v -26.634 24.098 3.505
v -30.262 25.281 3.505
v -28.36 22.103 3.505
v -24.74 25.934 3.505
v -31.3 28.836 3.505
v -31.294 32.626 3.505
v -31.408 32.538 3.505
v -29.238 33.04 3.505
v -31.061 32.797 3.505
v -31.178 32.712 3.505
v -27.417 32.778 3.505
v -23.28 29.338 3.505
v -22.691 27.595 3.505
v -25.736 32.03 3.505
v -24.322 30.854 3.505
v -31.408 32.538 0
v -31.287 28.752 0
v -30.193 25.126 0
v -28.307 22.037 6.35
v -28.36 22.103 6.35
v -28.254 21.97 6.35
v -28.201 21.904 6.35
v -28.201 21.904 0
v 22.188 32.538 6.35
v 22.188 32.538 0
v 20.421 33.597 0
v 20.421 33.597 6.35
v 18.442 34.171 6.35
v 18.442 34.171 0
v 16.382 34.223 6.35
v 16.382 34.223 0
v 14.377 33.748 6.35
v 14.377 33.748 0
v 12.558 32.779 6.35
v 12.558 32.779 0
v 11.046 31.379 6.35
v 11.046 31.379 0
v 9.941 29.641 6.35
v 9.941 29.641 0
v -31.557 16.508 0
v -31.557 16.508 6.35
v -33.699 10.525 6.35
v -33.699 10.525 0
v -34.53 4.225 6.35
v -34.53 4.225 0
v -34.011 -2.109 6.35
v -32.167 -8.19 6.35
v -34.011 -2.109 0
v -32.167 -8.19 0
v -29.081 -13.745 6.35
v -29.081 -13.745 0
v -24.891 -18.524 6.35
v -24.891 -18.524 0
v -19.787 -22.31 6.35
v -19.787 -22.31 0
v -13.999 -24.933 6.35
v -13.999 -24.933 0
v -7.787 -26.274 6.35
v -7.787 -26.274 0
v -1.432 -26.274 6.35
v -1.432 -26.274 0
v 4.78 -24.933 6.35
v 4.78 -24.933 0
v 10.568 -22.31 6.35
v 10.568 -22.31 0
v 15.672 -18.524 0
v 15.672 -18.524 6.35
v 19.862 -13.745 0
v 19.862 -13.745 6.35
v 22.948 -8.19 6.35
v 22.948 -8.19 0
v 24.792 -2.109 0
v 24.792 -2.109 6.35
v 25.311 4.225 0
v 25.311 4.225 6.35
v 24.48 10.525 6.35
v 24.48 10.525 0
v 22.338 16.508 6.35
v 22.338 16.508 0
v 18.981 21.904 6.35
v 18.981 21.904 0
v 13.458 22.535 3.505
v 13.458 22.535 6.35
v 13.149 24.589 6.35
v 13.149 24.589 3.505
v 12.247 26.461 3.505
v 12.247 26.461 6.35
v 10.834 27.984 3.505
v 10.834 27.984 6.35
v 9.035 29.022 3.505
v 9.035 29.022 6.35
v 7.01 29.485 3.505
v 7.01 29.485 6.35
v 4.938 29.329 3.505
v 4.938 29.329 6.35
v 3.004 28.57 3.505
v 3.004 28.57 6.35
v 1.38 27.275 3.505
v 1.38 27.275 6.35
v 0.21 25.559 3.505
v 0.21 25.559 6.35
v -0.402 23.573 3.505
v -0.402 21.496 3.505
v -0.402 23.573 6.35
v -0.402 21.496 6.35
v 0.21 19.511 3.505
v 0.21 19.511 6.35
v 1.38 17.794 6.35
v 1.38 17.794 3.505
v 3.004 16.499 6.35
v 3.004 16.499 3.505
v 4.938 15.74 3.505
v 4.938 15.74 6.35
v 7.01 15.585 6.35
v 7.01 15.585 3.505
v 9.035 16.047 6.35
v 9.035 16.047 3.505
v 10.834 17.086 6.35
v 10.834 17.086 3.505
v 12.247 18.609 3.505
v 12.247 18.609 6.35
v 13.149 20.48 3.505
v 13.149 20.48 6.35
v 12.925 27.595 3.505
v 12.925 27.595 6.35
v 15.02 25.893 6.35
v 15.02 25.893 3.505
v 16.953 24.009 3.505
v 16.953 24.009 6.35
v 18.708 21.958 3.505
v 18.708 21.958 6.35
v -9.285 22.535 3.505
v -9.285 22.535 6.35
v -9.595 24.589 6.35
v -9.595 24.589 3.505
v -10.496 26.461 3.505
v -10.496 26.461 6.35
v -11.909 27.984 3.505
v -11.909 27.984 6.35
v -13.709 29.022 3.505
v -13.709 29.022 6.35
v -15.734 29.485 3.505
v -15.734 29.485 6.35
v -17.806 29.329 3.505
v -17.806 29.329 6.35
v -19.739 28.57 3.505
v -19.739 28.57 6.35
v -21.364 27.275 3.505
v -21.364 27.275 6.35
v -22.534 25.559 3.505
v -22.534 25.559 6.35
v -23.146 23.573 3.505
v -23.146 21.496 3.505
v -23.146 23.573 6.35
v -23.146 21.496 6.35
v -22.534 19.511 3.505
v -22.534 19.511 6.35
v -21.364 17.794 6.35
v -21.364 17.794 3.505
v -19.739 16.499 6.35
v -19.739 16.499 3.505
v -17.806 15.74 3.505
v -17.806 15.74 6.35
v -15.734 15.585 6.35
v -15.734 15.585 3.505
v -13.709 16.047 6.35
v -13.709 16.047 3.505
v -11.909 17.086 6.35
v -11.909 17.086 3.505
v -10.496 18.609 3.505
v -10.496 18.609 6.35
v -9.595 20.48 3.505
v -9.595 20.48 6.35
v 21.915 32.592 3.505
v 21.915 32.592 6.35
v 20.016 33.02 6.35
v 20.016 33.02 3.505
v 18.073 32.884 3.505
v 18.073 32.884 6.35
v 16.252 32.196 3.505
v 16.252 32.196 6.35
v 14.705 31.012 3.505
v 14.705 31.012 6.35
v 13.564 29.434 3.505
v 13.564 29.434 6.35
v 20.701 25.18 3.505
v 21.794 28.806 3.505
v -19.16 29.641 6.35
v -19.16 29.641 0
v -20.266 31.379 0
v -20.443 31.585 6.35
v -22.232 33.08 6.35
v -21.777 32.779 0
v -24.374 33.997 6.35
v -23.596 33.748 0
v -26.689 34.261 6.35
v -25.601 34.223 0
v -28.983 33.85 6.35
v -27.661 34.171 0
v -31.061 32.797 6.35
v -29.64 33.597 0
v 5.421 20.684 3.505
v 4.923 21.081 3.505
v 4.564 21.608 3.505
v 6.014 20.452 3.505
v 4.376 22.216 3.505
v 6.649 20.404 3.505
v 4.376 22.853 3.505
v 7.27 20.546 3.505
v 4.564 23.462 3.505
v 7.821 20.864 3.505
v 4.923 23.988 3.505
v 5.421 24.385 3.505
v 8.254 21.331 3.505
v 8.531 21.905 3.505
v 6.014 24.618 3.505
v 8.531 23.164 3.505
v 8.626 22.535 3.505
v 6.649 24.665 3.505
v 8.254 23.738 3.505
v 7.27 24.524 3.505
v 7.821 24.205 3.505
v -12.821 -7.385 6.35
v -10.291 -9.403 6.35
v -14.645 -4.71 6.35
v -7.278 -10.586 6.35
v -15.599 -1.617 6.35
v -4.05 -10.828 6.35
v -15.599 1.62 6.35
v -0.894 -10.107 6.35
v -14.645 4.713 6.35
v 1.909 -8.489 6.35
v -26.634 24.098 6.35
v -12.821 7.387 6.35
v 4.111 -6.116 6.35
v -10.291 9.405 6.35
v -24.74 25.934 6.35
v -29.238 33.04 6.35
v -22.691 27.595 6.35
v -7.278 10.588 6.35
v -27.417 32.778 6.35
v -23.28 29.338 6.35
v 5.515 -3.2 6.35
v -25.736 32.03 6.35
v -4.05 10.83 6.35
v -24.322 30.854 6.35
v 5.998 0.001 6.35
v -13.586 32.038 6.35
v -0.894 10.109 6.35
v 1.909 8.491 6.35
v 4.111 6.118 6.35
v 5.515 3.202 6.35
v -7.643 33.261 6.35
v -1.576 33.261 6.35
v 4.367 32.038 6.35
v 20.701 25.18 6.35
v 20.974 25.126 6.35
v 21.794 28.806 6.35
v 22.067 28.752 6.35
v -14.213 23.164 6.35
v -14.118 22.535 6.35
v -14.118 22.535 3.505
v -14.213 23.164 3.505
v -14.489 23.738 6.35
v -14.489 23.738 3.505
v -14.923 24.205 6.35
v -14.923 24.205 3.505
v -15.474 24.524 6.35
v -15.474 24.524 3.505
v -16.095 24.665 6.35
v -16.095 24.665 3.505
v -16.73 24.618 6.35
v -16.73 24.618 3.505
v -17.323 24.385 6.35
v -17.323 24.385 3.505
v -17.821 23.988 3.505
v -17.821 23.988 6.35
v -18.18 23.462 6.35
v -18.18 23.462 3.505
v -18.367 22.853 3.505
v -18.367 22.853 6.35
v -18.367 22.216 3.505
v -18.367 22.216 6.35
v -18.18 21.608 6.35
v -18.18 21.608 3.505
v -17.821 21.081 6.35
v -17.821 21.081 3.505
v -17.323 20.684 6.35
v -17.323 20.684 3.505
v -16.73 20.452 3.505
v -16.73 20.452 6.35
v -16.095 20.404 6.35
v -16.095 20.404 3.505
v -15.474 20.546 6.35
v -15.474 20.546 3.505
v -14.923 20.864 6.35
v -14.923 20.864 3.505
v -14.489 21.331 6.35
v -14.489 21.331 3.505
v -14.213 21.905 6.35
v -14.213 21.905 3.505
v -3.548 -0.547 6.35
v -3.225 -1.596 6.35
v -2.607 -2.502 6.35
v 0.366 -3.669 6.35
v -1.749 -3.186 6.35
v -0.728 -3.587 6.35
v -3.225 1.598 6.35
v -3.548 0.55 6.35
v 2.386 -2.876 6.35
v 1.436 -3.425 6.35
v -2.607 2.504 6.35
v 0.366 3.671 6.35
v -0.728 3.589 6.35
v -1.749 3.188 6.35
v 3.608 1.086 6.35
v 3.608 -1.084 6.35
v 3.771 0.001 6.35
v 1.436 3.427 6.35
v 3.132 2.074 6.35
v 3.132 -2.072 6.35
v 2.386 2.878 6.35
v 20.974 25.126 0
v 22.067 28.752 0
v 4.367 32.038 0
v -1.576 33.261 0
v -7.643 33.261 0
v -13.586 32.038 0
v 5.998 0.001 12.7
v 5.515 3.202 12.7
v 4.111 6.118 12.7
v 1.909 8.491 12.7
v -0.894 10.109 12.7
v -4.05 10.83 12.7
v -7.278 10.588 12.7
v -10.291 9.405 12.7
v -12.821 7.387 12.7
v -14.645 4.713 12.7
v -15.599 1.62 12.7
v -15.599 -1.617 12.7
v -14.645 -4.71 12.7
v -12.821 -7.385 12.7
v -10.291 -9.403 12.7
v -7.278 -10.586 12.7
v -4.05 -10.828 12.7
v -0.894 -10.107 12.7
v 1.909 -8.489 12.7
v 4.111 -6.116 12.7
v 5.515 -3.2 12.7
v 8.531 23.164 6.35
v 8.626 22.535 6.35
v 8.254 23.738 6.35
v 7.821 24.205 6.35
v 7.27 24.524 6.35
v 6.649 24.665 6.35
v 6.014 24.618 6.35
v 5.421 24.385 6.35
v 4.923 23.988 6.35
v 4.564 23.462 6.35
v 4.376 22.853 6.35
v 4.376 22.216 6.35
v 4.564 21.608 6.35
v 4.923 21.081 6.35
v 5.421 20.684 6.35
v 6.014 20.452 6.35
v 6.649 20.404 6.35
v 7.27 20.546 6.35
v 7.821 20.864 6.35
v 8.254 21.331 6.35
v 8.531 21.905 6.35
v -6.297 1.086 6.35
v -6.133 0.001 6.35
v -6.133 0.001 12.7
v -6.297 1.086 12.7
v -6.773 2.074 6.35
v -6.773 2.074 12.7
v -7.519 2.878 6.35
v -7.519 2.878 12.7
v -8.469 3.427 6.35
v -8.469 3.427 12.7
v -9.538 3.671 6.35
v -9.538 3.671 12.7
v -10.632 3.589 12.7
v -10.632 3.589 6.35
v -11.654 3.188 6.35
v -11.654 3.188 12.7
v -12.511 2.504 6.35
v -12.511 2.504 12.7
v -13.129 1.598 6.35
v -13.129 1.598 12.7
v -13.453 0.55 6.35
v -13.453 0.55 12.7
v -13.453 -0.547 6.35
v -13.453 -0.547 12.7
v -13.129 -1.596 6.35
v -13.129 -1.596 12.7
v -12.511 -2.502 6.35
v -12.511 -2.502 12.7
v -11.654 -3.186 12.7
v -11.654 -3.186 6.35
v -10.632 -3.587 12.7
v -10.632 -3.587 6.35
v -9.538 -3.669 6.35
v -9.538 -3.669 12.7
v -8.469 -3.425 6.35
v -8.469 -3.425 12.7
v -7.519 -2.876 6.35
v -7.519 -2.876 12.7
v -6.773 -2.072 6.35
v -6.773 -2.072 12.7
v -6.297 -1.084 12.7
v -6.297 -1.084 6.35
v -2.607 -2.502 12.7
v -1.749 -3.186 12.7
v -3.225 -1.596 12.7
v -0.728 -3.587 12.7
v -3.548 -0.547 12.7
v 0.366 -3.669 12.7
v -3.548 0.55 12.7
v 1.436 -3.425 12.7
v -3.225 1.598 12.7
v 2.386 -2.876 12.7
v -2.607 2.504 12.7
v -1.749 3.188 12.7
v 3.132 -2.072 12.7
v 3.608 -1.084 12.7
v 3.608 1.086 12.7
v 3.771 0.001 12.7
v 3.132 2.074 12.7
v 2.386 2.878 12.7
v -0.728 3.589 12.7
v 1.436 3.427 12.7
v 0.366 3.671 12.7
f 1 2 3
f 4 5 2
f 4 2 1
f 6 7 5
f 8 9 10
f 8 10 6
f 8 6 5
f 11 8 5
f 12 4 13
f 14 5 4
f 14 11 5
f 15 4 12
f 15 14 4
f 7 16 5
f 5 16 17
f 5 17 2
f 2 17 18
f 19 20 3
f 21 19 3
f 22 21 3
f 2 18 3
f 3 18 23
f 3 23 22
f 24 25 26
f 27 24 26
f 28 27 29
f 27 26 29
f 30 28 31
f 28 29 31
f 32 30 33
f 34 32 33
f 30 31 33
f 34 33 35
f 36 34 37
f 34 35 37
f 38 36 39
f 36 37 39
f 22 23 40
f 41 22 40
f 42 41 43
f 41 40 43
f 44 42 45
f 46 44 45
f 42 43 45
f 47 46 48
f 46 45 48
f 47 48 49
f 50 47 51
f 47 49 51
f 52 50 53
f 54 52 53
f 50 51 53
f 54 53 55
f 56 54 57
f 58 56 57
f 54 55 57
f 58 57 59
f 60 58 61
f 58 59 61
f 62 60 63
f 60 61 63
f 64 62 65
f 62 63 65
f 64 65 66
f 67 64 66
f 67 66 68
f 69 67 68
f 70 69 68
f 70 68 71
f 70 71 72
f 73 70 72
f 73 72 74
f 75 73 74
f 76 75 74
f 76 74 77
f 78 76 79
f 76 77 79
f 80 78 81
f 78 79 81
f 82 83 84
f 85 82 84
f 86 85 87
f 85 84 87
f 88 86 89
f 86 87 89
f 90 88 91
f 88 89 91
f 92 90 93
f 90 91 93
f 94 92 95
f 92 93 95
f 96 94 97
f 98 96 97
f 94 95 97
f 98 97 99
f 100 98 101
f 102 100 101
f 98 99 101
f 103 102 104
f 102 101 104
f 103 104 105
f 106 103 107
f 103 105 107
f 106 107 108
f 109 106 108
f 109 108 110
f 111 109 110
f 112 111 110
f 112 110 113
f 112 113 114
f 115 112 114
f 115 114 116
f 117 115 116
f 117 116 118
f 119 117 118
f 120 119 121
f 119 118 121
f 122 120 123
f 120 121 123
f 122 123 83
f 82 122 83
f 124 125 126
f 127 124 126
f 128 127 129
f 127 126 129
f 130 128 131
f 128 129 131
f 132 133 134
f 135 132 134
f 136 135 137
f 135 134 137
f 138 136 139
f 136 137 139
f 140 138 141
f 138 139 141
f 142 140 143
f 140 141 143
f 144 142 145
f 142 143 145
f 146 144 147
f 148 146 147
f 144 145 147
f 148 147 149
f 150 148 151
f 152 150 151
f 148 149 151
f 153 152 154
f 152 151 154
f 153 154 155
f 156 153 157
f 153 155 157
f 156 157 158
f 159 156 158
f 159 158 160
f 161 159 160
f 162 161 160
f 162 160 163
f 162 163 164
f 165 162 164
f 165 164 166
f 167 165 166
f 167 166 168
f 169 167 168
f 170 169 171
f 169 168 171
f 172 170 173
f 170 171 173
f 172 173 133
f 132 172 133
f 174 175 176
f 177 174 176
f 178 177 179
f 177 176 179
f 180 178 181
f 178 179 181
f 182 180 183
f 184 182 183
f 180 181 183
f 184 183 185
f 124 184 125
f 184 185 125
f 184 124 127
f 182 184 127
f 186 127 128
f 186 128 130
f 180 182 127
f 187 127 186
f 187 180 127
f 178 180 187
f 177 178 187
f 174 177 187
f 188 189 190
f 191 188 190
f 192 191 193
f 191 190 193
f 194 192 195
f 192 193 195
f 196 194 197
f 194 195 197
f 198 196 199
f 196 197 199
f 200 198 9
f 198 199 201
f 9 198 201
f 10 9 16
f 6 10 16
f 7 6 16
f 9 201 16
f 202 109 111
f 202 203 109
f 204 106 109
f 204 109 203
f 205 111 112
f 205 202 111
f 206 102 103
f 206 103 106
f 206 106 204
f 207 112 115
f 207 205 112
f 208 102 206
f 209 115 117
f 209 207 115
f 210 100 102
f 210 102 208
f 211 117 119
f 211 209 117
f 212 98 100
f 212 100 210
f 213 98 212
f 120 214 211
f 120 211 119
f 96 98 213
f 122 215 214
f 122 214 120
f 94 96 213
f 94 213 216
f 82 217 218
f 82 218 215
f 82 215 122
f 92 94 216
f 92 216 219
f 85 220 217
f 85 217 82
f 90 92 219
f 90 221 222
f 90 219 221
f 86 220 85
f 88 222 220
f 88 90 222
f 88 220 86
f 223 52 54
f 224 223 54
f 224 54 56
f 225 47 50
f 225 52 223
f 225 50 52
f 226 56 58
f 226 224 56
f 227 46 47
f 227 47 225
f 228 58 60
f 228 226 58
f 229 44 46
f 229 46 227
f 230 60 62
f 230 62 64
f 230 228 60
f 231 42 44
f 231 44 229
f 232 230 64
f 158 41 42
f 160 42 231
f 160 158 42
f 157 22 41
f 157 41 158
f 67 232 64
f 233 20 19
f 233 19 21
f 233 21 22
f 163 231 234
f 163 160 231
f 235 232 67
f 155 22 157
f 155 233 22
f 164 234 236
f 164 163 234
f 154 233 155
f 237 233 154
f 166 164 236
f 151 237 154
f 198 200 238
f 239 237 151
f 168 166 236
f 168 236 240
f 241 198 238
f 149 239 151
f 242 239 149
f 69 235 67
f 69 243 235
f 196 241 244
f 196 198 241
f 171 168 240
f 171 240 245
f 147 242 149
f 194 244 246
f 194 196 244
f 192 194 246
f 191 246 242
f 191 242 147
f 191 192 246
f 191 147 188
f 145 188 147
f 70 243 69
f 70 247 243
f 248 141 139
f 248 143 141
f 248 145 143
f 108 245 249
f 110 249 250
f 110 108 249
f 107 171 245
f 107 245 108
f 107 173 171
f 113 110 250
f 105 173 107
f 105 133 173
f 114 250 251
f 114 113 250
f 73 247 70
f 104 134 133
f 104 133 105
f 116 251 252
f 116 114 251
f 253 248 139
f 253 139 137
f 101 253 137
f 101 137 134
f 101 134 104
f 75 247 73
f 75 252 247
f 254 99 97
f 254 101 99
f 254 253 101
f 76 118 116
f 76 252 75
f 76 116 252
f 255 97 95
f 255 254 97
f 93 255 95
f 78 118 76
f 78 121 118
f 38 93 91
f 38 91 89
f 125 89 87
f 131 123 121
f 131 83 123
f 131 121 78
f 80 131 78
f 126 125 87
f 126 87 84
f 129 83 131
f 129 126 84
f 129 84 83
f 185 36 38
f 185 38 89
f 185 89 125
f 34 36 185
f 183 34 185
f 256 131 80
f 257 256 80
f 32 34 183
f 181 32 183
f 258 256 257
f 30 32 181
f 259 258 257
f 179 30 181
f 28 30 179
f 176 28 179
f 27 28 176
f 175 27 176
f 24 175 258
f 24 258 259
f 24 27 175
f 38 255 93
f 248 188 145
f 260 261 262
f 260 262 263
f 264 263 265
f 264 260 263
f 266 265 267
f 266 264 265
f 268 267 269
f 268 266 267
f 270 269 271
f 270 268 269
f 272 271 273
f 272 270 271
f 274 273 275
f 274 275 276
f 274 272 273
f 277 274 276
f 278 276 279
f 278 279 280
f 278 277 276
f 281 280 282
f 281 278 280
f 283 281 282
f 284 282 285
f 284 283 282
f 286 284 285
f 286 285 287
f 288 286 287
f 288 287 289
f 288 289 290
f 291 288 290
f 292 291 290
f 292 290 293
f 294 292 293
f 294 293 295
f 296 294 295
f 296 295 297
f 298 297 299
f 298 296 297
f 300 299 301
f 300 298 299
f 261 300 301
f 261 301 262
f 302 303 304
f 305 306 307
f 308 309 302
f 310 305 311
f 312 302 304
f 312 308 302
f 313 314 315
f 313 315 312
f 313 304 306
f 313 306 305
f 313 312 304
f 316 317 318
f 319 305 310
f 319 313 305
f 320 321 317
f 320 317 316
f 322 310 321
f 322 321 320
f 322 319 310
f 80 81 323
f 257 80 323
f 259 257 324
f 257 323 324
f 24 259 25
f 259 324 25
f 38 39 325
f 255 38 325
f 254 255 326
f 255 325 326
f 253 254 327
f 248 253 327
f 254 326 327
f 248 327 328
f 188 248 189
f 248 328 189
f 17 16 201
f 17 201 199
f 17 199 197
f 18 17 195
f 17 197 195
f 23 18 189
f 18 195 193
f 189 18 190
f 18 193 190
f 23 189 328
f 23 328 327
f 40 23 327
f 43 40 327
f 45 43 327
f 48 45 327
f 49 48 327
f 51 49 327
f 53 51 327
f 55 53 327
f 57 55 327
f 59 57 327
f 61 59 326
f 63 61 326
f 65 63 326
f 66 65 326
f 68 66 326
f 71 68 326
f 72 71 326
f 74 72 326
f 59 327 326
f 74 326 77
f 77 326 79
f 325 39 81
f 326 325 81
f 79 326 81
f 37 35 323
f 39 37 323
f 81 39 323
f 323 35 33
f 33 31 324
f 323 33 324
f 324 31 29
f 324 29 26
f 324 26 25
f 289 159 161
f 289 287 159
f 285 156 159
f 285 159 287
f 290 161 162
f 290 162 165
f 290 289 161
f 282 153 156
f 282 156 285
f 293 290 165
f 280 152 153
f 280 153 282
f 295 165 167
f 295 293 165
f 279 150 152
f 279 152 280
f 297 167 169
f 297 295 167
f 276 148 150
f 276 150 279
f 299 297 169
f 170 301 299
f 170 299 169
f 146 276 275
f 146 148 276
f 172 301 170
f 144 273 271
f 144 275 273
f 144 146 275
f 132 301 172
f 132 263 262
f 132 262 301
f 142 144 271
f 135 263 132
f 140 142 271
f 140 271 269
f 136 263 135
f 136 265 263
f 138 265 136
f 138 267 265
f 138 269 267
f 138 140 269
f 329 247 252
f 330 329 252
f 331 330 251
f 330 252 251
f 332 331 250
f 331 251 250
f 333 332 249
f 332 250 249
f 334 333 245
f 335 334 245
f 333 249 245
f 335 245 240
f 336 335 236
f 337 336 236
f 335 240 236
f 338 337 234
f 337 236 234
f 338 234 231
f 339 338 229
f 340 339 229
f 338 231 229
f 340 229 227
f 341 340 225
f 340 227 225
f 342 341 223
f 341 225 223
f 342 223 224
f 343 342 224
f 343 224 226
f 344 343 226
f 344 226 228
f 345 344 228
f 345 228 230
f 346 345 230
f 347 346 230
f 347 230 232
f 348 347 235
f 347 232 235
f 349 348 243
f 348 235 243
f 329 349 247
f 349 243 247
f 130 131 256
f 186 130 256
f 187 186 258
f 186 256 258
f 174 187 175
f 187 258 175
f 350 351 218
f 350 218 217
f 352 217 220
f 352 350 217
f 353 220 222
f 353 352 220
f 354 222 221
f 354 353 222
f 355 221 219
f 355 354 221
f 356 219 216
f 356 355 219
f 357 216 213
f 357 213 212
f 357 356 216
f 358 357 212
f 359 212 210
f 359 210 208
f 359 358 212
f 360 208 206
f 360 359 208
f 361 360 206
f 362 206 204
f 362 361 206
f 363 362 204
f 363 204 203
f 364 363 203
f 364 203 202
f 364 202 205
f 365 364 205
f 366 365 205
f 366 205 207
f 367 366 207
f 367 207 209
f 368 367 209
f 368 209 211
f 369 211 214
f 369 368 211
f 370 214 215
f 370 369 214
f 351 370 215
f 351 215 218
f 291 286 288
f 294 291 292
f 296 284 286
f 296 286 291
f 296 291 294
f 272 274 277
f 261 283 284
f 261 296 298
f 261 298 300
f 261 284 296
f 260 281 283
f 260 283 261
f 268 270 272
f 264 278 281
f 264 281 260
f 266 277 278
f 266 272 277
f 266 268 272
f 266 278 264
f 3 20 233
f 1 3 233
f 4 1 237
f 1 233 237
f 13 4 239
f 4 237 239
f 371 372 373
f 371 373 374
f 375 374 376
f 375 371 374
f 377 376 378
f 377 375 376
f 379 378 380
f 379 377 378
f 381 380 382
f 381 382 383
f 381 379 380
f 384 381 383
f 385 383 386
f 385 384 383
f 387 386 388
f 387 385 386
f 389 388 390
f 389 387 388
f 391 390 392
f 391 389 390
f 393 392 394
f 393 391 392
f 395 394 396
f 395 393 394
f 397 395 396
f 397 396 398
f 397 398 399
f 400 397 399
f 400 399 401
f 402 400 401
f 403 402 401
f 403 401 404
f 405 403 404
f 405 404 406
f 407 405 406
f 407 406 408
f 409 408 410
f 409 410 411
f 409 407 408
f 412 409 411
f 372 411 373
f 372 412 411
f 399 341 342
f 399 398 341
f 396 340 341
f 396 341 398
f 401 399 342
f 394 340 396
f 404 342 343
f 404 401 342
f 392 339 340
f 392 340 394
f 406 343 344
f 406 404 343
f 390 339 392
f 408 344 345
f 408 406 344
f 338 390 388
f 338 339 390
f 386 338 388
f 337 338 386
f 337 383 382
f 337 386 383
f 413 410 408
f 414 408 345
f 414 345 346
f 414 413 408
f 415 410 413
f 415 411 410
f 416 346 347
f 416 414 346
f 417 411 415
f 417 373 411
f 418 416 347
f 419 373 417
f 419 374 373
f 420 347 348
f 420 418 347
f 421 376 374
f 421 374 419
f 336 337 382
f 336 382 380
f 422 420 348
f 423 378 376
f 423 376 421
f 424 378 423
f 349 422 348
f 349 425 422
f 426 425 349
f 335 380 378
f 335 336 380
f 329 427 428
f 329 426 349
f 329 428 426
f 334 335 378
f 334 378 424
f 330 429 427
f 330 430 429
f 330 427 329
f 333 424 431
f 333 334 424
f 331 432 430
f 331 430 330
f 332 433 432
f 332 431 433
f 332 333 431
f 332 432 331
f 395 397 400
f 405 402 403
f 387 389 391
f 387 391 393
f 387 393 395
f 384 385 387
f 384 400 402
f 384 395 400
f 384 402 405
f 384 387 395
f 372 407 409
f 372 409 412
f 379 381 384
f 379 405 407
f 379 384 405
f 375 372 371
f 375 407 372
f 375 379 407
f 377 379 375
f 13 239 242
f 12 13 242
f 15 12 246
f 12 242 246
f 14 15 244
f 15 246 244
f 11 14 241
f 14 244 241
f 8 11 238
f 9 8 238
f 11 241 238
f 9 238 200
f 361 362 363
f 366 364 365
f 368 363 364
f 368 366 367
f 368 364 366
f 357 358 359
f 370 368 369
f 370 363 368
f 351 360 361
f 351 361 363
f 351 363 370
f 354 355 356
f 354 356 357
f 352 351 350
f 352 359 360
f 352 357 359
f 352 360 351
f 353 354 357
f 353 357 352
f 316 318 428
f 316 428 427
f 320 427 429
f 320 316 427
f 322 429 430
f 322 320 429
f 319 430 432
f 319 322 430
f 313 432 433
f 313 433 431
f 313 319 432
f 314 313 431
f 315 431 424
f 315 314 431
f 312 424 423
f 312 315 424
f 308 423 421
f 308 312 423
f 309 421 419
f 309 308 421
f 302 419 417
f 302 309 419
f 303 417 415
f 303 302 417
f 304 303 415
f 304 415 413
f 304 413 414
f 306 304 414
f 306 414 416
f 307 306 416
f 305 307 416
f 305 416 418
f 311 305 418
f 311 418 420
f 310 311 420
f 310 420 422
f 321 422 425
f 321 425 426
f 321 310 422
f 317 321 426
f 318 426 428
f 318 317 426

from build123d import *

# Parameters (mm, degrees)
F1_DEPTH = 6.35
F2_R     = 10.8590085074
F2_R_2   = 3.6802492117
F3_DEPTH = 6.35
F4_R     = 6.9693581069
F4_R_2   = 2.1365687552
F5_DEPTH = 2.8448


with BuildPart() as f1:
    # F0 (on Top) → F1 (new body)
    with BuildSketch(Plane.XY):
        with BuildLine():
            ThreePointArc((22.1884083003, 32.5379781425), (15.3640692537, 34.0499493944), (9.9405326157, 29.6405377755))
            ThreePointArc((9.9405326157, 29.6405377755), (-4.6095652506, 33.4153325113), (-19.1596631168, 29.6405377755))
            ThreePointArc((-19.1596631168, 29.6405377755), (-24.5831997549, 34.0499493944), (-31.4075388014, 32.5379781425))
            ThreePointArc((-31.4075388014, 32.5379781425), (-30.8582548555, 26.9031615507), (-28.2005693571, 21.9042037926))
            ThreePointArc((-28.2005693571, 21.9042037926), (-4.6095652506, -26.4433986324), (18.981438856, 21.9042037926))
            ThreePointArc((18.981438856, 21.9042037926), (21.6391243544, 26.9031615507), (22.1884083003, 32.5379781425))
        make_face()
    extrude(amount=F1_DEPTH)

    # F2 (on face) → F3 (join)
    with BuildSketch(Plane.XY.offset(6.35)):
        with Locations((-4.8612458631, 0.0010582291)):
            Circle(F2_R)
        with Locations((-9.8135089502, 0.0010582291)):
            Circle(F2_R_2, mode=Mode.SUBTRACT)
        with Locations((0.0910172239, 0.0010582291)):
            Circle(F2_R_2, mode=Mode.SUBTRACT)
    extrude(amount=F3_DEPTH)

    # F4 (on face) → F5 (cut)
    with BuildSketch(Plane.XY.offset(6.35)):
        with BuildLine():
            ThreePointArc((-31.4075388014, 32.5379781425), (-30.8945224978, 27.0253518282), (-28.359989317, 22.103118985))
            ThreePointArc((-28.359989317, 22.103118985), (-25.7072477965, 25.0367408797), (-22.6908403268, 27.5949552906))
            ThreePointArc((-22.6908403268, 27.5949552906), (-25.7360645395, 32.0302919162), (-31.0613331918, 32.7965263897))
            ThreePointArc((-31.0613331918, 32.7965263897), (-31.2361754941, 32.6695815173), (-31.4075388014, 32.5379781425))
        make_face()
        with Locations((-16.254756134, 22.5346526879)):
            Circle(F4_R)
        with Locations((-16.254756134, 22.5346526879)):
            Circle(F4_R_2, mode=Mode.SUBTRACT)
        with Locations((6.4890854992, 22.5346526879)):
            Circle(F4_R)
        with Locations((6.4890854992, 22.5346526879)):
            Circle(F4_R_2, mode=Mode.SUBTRACT)
        with BuildLine():
            ThreePointArc((12.925169692, 27.5949552906), (16.007657655, 24.9725297062), (18.7081687892, 21.9582159201))
            ThreePointArc((18.7081687892, 21.9582159201), (21.3658542875, 26.9571736782), (21.9151382335, 32.59199027))
            ThreePointArc((21.9151382335, 32.59199027), (16.251635807, 32.1957077064), (12.925169692, 27.5949552906))
        make_face()
    extrude(amount=-F5_DEPTH, mode=Mode.SUBTRACT)


solid = f1.part
